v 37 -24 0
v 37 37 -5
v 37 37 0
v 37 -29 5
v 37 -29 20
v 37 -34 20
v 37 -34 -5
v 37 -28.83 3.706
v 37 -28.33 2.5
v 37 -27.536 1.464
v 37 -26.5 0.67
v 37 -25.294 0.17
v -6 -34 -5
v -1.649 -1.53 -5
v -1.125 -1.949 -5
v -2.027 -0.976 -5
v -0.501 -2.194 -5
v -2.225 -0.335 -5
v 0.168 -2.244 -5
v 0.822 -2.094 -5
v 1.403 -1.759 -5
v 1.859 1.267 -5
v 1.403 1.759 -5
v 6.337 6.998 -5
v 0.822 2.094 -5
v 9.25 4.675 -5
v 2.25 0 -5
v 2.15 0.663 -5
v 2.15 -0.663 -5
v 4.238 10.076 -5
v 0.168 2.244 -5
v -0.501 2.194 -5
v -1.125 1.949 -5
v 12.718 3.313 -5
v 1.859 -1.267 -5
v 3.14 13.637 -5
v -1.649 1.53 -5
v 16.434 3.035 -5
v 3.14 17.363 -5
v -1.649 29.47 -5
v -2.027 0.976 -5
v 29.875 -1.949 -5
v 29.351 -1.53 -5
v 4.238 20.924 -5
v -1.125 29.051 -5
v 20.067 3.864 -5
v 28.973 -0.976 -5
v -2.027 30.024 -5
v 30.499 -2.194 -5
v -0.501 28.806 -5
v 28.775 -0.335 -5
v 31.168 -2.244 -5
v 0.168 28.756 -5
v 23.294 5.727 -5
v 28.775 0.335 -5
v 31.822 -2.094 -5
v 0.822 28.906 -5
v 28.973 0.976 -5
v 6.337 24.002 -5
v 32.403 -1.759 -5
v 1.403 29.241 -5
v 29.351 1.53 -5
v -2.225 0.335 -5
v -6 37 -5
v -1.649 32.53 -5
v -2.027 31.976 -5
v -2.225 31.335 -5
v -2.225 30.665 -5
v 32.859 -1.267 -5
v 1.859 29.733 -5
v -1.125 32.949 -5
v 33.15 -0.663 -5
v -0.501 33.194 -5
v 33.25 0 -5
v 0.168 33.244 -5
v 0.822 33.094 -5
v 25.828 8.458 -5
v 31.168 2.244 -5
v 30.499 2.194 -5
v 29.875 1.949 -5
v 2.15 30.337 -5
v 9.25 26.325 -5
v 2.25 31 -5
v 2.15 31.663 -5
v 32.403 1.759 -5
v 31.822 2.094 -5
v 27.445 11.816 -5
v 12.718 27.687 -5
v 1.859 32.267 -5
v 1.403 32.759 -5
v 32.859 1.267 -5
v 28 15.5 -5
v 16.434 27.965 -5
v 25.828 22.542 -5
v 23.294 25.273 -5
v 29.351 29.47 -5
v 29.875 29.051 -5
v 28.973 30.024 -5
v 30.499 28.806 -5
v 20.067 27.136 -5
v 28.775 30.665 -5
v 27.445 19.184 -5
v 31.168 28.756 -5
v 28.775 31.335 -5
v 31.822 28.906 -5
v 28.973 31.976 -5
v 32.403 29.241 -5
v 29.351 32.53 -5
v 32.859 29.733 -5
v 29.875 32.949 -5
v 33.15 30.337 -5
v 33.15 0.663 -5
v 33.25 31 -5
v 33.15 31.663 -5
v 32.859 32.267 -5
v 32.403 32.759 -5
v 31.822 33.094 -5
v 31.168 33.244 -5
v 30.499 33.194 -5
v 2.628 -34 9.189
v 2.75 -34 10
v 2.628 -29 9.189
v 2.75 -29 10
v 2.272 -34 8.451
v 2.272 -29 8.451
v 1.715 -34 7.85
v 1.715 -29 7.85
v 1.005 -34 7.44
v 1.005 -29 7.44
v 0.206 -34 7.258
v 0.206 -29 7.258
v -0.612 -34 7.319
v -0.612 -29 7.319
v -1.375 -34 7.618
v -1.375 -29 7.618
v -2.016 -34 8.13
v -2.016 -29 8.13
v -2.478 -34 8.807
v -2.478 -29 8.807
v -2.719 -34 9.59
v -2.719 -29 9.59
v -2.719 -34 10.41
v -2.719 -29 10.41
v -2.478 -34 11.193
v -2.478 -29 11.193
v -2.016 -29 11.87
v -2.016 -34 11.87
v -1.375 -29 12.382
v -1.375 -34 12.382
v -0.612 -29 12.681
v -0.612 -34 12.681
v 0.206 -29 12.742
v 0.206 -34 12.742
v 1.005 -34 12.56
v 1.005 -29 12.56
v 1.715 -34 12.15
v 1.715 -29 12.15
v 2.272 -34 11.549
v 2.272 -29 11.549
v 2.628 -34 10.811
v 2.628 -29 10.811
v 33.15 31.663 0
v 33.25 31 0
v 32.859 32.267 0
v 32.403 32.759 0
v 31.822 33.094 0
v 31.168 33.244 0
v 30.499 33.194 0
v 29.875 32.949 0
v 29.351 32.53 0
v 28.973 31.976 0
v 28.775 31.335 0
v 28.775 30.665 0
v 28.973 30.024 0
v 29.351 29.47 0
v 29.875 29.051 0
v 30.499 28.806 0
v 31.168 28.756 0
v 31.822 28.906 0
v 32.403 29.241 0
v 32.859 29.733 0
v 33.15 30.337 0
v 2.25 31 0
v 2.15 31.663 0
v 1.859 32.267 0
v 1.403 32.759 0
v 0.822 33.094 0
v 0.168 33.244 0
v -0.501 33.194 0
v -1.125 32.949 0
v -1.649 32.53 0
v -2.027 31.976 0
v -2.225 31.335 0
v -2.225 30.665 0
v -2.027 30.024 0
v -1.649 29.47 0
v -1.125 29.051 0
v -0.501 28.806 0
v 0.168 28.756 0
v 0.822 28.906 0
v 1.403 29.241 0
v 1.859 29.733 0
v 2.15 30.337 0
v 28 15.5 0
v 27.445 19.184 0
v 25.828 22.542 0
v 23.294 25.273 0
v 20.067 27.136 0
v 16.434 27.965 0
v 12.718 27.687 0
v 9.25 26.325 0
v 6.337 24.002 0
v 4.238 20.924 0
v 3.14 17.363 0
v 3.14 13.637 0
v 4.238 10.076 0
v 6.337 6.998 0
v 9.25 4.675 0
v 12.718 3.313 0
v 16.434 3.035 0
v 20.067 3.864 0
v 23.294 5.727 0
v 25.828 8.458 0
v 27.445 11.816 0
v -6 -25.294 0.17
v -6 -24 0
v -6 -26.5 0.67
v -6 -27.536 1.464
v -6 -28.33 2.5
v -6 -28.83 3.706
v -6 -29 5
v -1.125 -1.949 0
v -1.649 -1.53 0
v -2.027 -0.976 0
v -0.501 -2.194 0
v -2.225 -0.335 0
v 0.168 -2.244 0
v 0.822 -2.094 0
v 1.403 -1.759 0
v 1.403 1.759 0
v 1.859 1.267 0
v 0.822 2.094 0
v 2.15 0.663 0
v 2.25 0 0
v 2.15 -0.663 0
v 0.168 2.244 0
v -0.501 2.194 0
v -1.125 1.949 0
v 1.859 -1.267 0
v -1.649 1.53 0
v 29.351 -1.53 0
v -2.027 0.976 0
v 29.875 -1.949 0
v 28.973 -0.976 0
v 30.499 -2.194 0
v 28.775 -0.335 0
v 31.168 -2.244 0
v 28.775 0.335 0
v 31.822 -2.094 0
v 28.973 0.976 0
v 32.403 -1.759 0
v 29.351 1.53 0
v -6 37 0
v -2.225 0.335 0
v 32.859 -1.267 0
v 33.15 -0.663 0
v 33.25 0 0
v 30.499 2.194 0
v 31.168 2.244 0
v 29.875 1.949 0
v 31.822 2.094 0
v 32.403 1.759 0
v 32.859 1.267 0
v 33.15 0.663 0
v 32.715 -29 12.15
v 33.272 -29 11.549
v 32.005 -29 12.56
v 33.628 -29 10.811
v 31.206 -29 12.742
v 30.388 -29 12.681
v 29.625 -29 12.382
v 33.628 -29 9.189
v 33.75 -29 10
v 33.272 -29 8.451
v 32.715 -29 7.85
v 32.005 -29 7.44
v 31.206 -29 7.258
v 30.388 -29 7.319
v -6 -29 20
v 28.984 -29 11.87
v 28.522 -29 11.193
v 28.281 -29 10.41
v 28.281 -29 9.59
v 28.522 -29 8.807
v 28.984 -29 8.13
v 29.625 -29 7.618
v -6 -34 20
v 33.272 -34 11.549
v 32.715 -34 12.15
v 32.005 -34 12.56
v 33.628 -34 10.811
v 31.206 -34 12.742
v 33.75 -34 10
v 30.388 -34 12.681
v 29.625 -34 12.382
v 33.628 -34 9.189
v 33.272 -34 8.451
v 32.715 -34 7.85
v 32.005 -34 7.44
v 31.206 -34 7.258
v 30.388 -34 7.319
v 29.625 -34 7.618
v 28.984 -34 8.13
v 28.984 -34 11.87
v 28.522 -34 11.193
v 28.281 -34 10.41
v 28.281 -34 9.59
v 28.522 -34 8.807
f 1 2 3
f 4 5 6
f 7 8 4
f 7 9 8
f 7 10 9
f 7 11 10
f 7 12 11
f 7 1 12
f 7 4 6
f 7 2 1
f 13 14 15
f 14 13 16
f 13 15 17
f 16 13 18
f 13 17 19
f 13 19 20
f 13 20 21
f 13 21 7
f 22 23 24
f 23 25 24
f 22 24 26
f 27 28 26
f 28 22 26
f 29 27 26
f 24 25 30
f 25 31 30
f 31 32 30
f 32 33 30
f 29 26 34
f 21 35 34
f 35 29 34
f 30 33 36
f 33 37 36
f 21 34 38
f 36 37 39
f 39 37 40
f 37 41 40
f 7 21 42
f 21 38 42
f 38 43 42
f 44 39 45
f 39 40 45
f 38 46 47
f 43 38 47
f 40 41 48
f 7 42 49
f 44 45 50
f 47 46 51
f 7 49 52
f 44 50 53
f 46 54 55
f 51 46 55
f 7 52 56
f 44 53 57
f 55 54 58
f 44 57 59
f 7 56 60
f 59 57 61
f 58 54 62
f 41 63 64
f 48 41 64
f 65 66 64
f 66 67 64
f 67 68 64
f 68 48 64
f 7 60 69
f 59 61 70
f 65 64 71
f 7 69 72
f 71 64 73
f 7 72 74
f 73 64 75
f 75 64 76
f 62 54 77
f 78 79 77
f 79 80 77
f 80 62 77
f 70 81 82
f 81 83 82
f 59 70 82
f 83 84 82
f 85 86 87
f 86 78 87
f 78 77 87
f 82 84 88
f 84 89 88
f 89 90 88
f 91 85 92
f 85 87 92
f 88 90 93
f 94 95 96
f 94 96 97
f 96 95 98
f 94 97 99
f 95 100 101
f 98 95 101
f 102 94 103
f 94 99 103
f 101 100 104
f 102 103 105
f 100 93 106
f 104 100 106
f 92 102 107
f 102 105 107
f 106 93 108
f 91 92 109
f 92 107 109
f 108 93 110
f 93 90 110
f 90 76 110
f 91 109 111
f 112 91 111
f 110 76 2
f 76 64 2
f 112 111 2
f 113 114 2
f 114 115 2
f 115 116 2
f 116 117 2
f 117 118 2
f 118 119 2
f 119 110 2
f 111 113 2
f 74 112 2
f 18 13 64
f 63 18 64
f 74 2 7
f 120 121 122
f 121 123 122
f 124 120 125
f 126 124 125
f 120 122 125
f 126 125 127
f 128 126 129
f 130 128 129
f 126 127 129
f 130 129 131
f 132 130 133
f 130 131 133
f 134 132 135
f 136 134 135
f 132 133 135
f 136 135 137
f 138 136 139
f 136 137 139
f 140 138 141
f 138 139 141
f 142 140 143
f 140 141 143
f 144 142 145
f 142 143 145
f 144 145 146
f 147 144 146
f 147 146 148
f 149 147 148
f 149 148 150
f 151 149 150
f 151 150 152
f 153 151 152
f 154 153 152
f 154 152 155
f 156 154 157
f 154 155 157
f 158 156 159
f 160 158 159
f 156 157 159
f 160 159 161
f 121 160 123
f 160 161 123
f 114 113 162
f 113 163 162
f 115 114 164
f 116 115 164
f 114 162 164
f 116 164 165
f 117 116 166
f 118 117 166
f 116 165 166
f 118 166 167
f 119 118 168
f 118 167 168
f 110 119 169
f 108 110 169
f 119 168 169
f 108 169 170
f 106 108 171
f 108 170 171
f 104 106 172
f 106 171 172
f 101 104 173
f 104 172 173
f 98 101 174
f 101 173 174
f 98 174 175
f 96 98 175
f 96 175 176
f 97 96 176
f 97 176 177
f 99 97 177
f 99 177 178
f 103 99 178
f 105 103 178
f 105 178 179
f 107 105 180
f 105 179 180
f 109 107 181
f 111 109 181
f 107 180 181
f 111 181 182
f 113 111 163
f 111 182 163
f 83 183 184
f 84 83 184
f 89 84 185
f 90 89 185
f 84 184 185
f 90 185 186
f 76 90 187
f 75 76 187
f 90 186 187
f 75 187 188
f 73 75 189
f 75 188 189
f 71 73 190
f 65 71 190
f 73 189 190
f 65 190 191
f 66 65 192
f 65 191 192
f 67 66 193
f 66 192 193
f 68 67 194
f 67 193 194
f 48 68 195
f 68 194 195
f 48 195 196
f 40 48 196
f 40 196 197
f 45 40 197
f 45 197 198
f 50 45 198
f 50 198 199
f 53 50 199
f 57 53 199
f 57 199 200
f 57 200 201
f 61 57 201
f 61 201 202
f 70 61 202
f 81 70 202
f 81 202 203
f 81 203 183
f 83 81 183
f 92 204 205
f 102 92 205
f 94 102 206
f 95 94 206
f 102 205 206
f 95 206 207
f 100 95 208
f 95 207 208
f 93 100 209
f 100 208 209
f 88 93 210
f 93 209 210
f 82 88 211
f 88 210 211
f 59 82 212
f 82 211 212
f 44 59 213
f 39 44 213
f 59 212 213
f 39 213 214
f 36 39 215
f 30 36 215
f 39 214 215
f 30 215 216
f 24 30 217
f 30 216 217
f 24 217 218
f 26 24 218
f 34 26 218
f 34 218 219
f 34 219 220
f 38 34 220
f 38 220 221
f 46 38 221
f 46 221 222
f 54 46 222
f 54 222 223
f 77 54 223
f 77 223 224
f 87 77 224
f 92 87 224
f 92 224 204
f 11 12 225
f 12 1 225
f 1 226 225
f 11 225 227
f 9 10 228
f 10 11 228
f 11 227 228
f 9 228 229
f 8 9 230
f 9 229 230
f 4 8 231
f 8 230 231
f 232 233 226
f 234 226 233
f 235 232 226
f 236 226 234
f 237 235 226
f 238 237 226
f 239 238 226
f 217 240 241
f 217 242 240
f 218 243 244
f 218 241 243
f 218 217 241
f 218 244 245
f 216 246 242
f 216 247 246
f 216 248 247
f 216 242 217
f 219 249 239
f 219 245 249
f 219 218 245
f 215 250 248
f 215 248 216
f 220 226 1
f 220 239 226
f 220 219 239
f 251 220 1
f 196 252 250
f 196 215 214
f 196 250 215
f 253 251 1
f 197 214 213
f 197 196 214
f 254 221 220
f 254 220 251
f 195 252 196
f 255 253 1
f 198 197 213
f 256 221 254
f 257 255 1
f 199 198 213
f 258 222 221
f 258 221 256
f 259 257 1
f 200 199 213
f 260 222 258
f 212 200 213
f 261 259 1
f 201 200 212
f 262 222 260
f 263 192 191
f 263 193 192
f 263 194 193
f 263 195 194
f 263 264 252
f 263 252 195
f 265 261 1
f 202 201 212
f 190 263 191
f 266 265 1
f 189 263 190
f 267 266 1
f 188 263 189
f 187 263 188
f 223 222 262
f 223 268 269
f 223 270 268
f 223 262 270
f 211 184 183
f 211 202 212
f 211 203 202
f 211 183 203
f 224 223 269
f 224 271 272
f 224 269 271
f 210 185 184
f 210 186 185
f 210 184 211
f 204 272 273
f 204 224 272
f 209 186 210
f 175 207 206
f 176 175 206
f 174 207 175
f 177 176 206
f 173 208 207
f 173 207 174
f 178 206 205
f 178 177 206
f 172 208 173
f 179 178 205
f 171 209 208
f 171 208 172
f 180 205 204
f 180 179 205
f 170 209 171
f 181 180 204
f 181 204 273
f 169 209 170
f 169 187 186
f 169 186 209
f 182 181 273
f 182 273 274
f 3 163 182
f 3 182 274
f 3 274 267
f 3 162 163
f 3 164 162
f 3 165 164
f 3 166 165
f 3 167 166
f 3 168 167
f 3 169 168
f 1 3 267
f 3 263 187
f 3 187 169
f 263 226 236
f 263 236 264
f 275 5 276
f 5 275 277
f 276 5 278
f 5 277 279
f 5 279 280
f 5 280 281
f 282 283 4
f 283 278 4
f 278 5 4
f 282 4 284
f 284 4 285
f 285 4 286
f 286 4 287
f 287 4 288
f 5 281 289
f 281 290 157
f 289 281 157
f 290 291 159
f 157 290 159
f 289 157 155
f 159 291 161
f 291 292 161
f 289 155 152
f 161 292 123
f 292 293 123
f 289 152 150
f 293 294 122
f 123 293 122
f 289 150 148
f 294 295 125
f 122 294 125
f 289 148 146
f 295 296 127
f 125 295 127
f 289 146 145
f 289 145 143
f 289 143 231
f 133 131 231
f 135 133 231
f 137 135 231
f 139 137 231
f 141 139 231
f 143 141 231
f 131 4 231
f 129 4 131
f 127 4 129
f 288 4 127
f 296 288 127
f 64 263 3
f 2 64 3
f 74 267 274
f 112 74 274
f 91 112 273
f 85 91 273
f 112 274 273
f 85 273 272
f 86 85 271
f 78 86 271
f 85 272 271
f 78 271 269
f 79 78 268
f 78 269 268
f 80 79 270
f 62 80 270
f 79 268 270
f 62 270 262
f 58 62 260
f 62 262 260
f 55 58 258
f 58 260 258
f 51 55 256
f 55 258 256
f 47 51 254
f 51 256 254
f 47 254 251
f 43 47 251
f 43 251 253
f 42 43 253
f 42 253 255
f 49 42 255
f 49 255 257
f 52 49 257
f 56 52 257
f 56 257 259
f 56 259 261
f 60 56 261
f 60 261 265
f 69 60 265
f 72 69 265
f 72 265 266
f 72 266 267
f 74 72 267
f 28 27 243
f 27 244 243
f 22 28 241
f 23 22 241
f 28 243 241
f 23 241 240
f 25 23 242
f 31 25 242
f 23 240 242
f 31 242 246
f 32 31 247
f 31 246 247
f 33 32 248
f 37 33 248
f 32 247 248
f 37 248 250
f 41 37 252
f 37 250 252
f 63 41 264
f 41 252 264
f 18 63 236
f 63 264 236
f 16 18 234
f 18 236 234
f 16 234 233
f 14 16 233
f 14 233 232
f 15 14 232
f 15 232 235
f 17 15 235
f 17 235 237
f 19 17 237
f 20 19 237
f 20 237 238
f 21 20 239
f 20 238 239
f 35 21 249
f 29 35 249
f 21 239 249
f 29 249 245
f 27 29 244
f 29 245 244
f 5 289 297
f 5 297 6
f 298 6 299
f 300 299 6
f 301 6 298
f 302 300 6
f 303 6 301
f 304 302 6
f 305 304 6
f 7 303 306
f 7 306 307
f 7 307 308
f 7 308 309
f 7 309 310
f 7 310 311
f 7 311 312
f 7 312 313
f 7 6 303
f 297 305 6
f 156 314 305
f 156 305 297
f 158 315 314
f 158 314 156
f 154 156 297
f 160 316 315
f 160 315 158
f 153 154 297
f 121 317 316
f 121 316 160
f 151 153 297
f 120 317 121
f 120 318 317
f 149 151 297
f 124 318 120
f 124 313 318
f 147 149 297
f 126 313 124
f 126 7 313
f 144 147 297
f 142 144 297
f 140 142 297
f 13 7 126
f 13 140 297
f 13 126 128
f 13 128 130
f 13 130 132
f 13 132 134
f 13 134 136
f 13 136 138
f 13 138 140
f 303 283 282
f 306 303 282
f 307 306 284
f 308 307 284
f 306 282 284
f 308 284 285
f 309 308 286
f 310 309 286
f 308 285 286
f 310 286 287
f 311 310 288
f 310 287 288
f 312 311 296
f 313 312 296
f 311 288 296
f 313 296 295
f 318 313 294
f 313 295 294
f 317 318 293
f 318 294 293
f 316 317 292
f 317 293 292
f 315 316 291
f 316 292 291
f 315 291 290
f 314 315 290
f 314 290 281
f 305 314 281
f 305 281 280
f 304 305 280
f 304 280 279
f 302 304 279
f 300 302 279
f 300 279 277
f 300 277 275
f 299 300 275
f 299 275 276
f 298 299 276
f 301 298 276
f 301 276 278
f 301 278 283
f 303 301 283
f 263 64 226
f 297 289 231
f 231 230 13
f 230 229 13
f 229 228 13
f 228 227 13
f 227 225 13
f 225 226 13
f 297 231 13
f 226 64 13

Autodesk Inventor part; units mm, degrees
ref_plane "YZ Plane" through (0, 0, 0) normal (1, 0, 0) x (0, 1, 0)
ref_plane "XZ Plane" through (0, 0, 0) normal (0, 1, 0) x (-1, 0, 0)
ref_plane "XY Plane" through (0, 0, 0) normal (0, 0, 1) x (1, 0, 0)
sketch "Sketch1" plane through (0, 0, 0) normal (0, 0, 1) x (1, 0, 0)
  circle A0 centre (0, 0) radius 2.25
  circle A1 centre (31, 0) radius 2.25
  circle A2 centre (0, 31) radius 2.25
  circle A3 centre (31, 31) radius 2.25
  circle A4 centre (15.5, 15.5) radius 12.5
  line L0 (-6, 37) -> (37, 37)
  line L1 (37, 37) -> (37, -6)
  line L2 (37, -6) -> (-6, -6)
  line L3 (-6, -6) -> (-6, 37)
  line L4 (-6, 37) -> (37, -6) construction
  line L5 (37, 37) -> (-6, -6) construction
  line L6 (-6, -6) -> (37, -6)
  line L7 (37, -6) -> (37, -34)
  line L8 (37, -34) -> (-6, -34)
  line L9 (-6, -34) -> (-6, -6)
  dimension "d3" = 4.5
  dimension "d5" = 31
  dimension "d6" = 25
  dimension "d7" = 43
  dimension "d8" = 43
  dimension "d9" = 49.5
  dimension "d10" = 31
extrude "Extrusion1" add sketch "Sketch1" against normal blind 5
sketch "Sketch2" plane through (0, 0, 0) normal (0, 0, 1) x (1, 0, 0)
  line L0 (37, -34) -> (-6, -34) projected
  line L1 (37, 37) -> (37, -34) projected
  line L2 (-6, -34) -> (37, -34)
  line L3 (37, -34) -> (37, -29)
  line L4 (37, -29) -> (-6, -29)
  line L5 (-6, -29) -> (-6, -34)
  point P0 (0, 0)
  dimension "d13" = 5
extrude "Extrusion2" add sketch "Sketch2" along normal blind 25
sketch "Sketch3" plane through (-6, -29, 0) normal (0, 1, 0) x (1, 0, 0)
  circle A0 centre (6, -10) radius 2.75
  circle A1 centre (37, -10) radius 2.75
  line L0 (0, 5) -> (0, -25) projected
  line L1 (0, 0) -> (0, -25) projected
  line L2 (43, 0) -> (43, -25) projected
  line L3 (0, 5) -> (43, 5) projected
  point P0 (6, 0)
  point P1 (0, -10)
  point P2 (0, -12.5)
  dimension "d16" = 5.5
  dimension "d17" = 31
  dimension "d23" = 6
  dimension "d24" = 15
extrude "Extrusion3" cut sketch "Sketch3" against normal blind 25
fillet "Fillet1" radius 5 1 edges at (15.5, -29, 0)
sketch "Sketch4" plane through (-6, -29, 25) normal (0, 1, 0) x (1, 0, 0)
  line L0 (0, 30) -> (0, 0) projected
  line L1 (0, 5) -> (43.1457, 5)
  circle A0 centre (6, 15) radius 2.75 projected
  line L2 (0, 20) -> (43, 20) projected
  line L3 (0, 20) -> (0, 0) projected
  line L4 (43, 0) -> (0, 0) projected
  line L5 (43, 20) -> (43, 0) projected
  circle A1 centre (6, 15) radius 2.75 projected
  circle A2 centre (37, 15) radius 2.75 projected
  point P0 (6, 25)
  point P1 (43, 5)
  dimension "d25" = 10
extrude "Extrusion4" cut sketch "Sketch4" against normal through all contours L1 L5 L4 L0
properties part number "motor_holder"
